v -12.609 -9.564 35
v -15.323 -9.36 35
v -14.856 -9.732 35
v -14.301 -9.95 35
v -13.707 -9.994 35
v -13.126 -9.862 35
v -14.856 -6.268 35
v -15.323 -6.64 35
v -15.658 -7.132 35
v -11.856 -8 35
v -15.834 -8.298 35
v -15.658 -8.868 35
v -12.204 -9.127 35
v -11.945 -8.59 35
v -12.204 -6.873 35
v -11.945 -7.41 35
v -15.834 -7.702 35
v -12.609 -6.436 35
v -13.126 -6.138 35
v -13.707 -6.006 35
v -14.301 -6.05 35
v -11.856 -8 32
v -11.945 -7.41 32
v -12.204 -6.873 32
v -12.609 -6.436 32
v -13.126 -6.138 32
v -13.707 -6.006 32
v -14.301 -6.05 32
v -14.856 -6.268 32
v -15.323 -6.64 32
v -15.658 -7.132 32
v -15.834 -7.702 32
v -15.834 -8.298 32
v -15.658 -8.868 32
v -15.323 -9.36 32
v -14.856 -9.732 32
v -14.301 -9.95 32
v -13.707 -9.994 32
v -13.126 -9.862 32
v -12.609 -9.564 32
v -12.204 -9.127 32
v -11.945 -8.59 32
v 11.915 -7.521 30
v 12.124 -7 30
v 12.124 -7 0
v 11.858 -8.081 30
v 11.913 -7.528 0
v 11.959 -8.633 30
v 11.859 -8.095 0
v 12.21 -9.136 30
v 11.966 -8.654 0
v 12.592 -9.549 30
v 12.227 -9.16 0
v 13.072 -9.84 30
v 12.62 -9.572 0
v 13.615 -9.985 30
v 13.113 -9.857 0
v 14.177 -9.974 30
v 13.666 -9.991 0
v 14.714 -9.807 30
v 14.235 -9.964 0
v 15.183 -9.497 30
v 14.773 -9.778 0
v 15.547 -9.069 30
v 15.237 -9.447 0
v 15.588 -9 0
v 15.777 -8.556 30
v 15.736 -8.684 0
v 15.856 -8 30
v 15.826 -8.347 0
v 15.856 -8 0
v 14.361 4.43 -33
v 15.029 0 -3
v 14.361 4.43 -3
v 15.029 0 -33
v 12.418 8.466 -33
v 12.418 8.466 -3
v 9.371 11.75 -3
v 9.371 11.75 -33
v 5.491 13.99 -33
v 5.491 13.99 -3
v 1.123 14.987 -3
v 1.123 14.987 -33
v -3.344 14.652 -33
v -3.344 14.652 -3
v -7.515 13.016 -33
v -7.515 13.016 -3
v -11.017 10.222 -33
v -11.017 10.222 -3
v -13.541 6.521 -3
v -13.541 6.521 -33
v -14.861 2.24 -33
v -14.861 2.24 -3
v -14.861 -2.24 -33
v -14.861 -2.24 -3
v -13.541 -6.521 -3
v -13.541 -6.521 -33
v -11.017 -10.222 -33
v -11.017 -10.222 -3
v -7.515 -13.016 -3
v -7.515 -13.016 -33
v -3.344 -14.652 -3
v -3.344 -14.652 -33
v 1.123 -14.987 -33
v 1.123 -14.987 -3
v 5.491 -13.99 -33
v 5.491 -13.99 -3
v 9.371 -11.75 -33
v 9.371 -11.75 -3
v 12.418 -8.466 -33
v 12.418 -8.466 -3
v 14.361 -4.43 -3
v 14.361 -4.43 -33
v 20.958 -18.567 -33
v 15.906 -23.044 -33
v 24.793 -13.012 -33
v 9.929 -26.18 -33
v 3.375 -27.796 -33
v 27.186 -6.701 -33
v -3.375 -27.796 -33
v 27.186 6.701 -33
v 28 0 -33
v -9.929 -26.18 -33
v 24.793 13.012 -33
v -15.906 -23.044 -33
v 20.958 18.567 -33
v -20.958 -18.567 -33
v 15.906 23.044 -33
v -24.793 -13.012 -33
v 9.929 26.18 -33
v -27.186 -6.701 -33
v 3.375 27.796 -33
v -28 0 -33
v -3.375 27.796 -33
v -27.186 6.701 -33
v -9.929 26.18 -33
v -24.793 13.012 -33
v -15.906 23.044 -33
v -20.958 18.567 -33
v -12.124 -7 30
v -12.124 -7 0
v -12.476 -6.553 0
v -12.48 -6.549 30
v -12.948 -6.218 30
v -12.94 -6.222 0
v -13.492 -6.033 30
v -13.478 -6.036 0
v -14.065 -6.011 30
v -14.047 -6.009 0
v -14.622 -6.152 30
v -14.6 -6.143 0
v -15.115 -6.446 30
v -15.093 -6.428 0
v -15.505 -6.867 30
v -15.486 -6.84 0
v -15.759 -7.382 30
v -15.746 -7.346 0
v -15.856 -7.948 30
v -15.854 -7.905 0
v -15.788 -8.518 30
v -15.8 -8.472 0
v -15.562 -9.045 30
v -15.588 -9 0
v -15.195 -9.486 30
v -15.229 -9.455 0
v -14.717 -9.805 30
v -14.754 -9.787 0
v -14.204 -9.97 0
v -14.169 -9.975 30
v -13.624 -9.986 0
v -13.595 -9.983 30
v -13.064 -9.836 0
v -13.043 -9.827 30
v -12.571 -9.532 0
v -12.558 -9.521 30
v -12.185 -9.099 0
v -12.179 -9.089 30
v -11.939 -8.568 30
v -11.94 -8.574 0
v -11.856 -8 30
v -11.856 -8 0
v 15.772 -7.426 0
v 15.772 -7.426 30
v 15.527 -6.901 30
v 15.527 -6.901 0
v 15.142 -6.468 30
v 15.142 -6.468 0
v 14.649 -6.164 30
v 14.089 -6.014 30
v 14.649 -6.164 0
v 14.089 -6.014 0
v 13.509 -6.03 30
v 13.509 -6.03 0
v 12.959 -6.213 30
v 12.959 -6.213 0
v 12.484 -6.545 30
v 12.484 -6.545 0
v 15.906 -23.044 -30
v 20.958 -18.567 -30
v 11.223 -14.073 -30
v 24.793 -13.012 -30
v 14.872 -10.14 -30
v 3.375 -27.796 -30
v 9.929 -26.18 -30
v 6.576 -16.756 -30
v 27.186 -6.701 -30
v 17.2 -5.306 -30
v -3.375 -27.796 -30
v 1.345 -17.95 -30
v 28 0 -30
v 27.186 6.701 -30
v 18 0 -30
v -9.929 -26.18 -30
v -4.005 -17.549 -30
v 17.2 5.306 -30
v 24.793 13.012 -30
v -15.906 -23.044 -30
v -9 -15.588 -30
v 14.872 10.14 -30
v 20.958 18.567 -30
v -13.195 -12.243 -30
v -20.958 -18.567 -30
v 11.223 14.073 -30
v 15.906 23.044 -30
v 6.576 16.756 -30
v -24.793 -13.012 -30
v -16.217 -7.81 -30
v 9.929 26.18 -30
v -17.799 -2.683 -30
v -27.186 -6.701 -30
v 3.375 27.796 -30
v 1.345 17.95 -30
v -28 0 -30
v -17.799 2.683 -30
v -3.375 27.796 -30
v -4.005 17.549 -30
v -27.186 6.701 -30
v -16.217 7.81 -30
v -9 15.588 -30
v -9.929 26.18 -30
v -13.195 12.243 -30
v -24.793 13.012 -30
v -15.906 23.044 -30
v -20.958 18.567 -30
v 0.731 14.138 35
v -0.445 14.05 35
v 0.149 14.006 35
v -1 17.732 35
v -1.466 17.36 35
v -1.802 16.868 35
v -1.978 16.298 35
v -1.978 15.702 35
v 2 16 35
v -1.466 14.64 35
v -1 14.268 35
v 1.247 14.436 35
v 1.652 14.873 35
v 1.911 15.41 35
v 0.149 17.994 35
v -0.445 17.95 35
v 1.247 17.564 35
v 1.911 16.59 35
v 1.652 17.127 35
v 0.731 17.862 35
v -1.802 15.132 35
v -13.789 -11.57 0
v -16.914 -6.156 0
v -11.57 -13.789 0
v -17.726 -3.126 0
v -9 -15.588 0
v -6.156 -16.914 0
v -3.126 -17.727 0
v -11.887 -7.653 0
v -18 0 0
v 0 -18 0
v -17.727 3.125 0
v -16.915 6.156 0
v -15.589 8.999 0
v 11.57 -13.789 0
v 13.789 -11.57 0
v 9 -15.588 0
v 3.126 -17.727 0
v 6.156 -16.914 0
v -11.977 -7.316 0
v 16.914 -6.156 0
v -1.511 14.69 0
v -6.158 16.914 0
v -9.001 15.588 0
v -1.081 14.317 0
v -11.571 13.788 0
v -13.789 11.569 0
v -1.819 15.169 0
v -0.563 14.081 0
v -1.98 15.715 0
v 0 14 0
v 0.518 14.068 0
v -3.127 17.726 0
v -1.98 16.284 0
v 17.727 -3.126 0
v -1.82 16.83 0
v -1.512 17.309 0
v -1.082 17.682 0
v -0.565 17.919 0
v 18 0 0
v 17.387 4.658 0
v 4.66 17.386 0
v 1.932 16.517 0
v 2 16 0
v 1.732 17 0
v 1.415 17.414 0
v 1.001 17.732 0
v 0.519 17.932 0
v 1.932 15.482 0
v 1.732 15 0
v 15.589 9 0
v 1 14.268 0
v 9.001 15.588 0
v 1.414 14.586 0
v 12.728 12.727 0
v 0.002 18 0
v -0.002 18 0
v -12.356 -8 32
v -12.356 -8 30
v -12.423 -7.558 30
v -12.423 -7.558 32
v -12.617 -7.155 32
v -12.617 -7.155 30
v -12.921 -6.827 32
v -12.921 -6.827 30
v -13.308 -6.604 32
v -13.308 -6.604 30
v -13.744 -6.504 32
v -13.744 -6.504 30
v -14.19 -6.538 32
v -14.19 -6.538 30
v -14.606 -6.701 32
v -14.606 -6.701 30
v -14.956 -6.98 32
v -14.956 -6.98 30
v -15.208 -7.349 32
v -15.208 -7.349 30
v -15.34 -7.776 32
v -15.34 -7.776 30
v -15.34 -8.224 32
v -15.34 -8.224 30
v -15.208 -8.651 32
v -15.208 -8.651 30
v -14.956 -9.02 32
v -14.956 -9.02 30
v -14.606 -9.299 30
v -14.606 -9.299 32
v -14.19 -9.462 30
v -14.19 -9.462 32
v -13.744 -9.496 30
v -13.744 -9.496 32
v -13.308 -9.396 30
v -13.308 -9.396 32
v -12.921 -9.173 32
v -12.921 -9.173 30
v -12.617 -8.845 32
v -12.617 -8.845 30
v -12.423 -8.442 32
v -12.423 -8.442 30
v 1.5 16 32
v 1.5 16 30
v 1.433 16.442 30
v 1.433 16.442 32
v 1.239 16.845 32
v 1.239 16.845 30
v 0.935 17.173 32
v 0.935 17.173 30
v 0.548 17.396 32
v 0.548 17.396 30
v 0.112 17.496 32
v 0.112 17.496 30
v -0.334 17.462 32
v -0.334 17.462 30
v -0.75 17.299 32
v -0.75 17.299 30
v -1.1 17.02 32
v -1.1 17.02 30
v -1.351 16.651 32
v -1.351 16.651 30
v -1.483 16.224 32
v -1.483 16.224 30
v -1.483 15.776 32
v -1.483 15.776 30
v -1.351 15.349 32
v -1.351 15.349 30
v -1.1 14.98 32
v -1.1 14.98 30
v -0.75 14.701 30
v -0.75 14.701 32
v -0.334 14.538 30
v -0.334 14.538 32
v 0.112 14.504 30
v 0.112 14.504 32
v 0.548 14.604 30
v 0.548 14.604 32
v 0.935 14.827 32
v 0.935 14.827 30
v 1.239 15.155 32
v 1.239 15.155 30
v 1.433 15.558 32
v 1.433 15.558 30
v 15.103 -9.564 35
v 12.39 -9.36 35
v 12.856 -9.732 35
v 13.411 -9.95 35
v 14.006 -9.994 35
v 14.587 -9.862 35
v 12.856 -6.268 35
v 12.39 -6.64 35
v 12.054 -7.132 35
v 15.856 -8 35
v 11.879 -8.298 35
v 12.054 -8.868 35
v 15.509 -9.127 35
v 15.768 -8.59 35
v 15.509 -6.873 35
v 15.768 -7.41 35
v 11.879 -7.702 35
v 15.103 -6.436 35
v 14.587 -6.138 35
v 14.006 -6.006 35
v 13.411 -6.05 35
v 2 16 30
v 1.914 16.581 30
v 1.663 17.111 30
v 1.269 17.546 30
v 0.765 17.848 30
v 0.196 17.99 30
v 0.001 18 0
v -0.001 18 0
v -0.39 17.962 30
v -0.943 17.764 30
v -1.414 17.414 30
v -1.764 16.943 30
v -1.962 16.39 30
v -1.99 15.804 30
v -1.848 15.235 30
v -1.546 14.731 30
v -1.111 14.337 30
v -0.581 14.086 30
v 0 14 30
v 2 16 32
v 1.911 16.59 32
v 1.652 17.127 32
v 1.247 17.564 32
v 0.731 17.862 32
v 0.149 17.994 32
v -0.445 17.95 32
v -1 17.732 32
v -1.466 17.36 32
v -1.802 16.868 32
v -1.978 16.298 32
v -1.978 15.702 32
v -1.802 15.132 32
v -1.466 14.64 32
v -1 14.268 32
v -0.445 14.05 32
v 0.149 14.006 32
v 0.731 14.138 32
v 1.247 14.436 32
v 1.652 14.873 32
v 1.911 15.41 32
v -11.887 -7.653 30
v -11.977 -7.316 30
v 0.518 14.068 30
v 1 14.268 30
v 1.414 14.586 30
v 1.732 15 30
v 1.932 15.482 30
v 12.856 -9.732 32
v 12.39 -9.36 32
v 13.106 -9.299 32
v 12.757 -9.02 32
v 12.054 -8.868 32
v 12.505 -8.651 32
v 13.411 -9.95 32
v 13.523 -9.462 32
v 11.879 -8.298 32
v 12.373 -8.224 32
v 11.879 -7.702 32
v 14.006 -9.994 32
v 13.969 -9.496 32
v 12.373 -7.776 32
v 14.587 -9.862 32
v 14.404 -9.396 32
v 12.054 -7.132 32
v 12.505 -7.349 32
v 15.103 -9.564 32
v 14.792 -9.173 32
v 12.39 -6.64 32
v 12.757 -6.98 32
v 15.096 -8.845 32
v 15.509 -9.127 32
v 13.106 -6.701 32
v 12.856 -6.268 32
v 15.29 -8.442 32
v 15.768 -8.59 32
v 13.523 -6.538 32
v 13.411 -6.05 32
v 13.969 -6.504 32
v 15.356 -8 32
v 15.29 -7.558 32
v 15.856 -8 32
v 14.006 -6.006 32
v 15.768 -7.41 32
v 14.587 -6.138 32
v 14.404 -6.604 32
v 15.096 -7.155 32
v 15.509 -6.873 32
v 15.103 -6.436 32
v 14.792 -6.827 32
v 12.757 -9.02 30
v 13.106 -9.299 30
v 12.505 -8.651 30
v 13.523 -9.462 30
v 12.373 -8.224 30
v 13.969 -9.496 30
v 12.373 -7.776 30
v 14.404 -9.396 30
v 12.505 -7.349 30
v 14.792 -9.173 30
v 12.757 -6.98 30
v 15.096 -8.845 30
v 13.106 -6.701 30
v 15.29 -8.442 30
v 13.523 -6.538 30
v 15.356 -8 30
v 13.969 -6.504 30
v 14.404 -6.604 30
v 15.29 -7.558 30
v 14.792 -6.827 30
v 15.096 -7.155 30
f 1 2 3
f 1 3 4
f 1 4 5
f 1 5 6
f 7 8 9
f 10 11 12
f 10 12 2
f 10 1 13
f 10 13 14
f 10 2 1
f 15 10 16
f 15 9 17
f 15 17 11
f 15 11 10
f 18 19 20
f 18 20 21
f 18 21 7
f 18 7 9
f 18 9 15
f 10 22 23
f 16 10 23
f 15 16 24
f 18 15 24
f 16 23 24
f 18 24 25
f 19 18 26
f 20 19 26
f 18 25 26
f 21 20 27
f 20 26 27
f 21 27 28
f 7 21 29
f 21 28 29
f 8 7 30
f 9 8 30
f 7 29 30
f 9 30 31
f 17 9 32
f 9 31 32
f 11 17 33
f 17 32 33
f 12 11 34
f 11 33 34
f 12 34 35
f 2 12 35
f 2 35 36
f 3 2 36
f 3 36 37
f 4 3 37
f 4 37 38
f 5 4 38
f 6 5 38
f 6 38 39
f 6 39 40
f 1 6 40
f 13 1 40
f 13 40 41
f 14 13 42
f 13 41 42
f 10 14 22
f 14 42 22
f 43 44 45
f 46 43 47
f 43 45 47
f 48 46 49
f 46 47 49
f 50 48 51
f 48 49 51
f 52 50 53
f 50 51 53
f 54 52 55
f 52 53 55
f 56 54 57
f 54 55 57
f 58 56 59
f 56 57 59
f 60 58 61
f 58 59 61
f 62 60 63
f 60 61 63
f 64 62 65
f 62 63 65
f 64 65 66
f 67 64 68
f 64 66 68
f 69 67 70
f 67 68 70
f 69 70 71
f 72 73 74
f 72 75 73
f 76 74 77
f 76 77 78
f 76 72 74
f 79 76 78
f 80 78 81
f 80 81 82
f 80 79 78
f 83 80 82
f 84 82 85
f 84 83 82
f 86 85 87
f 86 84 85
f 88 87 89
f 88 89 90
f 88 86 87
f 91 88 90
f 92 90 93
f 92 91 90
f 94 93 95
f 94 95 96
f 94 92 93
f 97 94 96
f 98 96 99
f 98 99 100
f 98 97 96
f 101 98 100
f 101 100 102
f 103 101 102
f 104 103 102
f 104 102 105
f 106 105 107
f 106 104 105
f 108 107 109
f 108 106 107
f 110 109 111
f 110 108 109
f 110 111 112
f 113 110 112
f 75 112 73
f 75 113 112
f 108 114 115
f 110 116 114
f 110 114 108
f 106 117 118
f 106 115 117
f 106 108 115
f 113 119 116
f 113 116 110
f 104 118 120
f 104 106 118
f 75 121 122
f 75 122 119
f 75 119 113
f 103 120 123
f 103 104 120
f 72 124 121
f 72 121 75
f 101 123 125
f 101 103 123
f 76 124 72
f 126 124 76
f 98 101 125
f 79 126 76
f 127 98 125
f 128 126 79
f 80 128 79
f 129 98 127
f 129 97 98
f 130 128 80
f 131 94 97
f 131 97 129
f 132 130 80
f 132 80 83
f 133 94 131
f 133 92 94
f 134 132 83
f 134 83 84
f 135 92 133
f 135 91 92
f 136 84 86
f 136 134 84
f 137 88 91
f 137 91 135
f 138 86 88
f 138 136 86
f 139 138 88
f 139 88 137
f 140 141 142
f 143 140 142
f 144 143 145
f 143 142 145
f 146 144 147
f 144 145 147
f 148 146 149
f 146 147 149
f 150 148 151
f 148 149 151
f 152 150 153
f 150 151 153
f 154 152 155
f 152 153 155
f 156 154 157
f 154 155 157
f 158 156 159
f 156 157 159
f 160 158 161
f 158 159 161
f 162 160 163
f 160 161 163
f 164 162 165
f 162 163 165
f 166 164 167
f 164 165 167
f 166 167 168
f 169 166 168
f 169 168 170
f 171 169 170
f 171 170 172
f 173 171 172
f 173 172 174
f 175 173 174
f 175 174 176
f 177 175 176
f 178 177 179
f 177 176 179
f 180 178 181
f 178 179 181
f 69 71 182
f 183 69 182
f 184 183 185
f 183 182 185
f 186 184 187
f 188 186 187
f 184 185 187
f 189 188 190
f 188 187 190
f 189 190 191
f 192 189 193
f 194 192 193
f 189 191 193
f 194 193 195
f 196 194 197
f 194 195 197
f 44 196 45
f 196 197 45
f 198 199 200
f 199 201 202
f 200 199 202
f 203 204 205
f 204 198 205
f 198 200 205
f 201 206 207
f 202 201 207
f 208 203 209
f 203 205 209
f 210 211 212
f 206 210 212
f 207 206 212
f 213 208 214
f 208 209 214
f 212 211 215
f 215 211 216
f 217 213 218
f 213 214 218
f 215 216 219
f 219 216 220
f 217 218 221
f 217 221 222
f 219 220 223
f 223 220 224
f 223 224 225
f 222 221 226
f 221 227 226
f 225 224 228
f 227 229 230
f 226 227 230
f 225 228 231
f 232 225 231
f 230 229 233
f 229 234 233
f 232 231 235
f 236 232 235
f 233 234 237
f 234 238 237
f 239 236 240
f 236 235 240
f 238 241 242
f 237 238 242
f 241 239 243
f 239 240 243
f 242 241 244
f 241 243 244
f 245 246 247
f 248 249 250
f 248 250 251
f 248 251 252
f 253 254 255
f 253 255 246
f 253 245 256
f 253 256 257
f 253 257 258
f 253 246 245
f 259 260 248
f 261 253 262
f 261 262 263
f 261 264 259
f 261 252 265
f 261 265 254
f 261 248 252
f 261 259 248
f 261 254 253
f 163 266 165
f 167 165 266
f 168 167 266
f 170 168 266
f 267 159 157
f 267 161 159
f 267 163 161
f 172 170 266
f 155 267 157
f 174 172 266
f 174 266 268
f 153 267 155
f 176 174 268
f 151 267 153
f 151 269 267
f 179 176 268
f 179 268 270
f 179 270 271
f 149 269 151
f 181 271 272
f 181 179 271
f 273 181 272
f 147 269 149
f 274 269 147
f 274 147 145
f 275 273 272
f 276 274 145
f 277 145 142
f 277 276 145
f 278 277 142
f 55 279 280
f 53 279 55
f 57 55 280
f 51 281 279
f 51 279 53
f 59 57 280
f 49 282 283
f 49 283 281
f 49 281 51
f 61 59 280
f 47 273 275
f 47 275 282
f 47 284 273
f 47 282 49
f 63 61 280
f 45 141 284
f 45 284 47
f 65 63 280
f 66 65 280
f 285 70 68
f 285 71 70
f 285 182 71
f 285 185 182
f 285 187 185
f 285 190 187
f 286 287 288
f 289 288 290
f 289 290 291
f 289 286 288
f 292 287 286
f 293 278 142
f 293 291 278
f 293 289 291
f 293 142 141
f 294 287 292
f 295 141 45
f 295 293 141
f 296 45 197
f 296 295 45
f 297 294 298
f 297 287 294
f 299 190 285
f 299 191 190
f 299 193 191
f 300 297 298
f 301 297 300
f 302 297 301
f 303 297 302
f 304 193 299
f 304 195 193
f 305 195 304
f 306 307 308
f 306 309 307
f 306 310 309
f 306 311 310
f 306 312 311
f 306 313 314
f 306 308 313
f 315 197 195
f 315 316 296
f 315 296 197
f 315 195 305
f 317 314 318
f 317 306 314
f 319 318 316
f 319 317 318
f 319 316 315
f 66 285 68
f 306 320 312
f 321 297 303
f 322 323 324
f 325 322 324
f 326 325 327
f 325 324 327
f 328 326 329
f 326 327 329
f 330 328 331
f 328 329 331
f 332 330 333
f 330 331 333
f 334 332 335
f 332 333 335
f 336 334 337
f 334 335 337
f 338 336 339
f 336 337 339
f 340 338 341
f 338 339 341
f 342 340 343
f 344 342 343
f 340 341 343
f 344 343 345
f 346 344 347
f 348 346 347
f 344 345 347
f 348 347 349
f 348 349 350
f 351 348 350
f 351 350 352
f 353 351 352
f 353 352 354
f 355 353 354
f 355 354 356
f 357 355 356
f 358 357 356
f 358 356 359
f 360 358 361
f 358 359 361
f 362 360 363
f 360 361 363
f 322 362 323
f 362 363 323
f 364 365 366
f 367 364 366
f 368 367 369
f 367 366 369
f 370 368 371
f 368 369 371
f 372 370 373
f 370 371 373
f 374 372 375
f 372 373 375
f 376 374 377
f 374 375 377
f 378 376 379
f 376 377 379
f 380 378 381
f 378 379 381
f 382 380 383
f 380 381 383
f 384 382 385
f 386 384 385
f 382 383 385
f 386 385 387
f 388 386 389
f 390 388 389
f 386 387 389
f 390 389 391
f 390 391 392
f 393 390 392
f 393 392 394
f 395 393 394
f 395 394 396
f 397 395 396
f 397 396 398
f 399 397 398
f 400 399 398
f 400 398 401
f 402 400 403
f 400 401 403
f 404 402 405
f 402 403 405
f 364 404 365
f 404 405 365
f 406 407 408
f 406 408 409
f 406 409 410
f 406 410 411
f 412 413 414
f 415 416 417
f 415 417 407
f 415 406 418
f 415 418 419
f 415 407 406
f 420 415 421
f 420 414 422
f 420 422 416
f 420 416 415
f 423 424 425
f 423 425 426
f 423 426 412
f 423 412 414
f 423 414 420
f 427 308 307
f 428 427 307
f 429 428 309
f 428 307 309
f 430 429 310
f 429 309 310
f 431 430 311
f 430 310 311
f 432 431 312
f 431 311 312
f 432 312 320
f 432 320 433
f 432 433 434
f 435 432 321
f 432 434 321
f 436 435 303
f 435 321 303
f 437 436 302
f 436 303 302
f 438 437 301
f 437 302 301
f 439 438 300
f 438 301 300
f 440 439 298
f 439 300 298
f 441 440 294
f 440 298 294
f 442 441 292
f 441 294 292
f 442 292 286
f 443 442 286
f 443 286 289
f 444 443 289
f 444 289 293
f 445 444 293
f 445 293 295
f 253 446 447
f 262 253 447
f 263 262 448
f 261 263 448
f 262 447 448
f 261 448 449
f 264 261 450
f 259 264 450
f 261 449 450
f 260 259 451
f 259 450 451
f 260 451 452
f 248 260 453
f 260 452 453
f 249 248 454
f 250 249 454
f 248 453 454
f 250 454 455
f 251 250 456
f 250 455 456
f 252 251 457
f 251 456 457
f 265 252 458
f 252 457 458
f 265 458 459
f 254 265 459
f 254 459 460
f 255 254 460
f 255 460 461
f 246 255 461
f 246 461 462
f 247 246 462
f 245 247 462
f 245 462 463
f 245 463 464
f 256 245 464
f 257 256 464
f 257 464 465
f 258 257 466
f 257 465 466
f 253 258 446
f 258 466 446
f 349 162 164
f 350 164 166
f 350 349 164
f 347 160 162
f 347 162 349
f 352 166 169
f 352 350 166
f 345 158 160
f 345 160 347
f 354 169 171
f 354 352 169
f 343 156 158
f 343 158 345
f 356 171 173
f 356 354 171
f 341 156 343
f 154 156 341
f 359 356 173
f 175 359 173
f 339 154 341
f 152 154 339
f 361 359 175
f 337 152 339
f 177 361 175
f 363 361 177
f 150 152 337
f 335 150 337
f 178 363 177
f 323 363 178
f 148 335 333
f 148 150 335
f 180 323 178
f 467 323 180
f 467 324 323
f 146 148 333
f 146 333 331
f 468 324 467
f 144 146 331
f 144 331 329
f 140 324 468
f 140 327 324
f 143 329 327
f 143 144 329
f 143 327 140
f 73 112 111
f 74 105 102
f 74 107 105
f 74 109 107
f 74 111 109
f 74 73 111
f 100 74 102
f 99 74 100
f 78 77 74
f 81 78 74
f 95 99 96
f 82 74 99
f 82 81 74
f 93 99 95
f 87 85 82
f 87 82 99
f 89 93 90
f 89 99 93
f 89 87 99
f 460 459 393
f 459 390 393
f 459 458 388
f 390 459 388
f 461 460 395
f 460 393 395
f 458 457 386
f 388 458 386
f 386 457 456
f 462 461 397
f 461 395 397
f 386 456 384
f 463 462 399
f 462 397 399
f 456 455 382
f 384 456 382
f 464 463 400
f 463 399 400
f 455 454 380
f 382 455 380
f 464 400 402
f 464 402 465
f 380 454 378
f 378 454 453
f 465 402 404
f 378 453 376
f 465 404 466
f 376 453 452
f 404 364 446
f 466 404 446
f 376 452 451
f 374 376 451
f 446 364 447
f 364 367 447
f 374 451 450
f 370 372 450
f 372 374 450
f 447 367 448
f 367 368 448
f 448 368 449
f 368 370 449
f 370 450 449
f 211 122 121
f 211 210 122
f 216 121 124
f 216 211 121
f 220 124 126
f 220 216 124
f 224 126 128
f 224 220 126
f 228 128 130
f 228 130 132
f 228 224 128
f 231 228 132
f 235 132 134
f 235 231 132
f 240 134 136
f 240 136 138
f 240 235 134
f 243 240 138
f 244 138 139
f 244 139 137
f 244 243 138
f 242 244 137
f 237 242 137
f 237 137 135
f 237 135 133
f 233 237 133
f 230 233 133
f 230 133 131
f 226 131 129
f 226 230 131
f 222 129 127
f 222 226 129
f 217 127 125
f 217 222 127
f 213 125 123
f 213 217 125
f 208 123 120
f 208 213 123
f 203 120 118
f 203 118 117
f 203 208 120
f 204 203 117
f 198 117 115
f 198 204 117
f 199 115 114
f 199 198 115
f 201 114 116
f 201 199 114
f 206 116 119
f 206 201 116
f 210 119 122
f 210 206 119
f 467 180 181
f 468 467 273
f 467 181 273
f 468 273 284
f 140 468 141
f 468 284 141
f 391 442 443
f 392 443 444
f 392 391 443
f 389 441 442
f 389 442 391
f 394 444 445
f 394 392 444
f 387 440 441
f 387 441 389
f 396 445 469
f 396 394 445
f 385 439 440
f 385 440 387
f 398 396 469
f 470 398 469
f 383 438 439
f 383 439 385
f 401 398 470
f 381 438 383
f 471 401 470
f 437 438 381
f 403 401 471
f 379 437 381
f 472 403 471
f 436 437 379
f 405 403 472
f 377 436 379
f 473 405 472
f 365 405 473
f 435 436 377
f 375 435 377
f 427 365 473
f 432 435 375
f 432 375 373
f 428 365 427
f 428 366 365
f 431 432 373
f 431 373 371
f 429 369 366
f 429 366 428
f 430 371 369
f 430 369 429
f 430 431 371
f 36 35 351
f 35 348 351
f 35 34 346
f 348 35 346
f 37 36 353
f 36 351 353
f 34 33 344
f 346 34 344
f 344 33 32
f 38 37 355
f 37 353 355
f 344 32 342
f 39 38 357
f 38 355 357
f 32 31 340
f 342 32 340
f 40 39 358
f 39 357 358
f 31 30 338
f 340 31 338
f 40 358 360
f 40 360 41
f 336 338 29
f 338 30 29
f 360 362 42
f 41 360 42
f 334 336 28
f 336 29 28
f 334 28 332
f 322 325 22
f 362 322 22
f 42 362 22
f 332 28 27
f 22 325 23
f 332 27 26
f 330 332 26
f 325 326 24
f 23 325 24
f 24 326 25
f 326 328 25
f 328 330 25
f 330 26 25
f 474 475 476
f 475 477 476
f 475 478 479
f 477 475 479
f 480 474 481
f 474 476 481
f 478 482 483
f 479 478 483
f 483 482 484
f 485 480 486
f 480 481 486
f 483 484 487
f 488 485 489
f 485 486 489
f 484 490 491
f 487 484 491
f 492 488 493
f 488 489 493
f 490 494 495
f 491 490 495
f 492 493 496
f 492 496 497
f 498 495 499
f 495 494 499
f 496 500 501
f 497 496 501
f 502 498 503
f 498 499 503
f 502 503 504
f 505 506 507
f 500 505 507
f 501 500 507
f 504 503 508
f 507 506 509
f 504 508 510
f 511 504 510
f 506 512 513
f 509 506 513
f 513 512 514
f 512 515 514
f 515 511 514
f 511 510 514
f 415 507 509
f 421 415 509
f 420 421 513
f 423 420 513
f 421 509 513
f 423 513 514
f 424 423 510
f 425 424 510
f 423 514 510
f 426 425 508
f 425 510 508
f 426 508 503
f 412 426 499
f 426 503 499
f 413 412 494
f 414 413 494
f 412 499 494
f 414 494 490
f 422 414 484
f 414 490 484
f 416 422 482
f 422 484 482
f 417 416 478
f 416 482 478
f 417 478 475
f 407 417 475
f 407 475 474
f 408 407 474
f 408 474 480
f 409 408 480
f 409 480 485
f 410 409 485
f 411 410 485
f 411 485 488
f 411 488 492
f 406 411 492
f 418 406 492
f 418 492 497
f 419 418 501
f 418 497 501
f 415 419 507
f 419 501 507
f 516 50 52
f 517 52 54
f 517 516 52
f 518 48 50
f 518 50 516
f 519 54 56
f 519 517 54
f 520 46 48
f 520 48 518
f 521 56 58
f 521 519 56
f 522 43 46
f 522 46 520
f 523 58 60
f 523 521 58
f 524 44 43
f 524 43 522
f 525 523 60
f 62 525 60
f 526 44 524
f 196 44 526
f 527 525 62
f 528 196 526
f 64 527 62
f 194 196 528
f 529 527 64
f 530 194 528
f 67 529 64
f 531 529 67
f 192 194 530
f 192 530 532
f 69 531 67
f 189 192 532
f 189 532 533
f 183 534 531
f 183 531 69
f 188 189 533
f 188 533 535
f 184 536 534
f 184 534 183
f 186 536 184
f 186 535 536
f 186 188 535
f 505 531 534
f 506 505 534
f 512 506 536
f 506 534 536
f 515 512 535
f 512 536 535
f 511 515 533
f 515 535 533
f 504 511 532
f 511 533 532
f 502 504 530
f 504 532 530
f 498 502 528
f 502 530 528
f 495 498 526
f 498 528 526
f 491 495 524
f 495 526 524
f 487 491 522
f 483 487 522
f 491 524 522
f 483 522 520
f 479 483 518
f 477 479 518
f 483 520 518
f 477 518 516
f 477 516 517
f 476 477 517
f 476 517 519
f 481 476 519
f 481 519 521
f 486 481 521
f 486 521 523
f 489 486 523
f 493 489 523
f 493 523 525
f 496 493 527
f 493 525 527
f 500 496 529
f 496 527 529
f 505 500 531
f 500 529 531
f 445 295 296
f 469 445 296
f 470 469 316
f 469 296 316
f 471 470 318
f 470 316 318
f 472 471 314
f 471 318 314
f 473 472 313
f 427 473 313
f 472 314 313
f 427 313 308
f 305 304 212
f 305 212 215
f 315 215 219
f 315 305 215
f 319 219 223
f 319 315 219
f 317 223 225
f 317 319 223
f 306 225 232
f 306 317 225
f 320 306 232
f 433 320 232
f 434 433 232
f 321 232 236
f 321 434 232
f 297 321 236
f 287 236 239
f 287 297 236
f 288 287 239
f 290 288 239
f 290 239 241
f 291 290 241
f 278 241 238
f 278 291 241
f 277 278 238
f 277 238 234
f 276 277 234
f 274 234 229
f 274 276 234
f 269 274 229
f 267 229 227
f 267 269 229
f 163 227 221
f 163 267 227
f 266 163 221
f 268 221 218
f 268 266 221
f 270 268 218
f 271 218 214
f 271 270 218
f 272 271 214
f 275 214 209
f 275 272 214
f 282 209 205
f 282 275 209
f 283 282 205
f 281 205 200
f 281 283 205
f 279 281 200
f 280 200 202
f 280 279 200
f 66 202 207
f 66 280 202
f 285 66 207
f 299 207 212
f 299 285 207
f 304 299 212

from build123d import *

# Parameters (mm, degrees)
F0_W      = 10
F0_H      = 3
F3_DEPTH  = 30
F4_R      = 1.5
F5_DEPTH  = 2
F6_R      = 2
F7_DEPTH  = 3
F8_R      = 1.5
F9_DEPTH  = 2
F10_R     = 2
F11_DEPTH = 3
F12_R     = 1.5
F13_DEPTH = 2
F14_R     = 2
F15_DEPTH = 3


with BuildPart() as f1:
    # F0 (on Front) → F1 (revolve)
    with BuildSketch(Plane.XZ):
        Polygon((18, -30), (18, -3), (15.029126, -3), (15.029126, -33), (18, -33), align=None)
        Polygon((15.029126, -3), (18, -3), (18, 0), (0, 0), (0, -3), align=None)
        with Locations((23, -31.5)):
            Rectangle(F0_W, F0_H)
    revolve(axis=Axis((0, 0, -1.5), (0, 0, 1)))

    # F2 (on face) → F3 (join)
    with BuildSketch(Plane.XY):
        with BuildLine():
            ThreePointArc((0, 14), (1.414214, 14.585786), (2, 16))
            ThreePointArc((2, 16), (-1.414214, 17.414214), (0, 14))
        make_face()
        with BuildLine():
            ThreePointArc((15.856406, -8), (14.374045, -6.068148), (12.124356, -7))
            ThreePointArc((12.124356, -7), (13.338768, -9.931852), (15.856406, -8))
        make_face()
        with BuildLine():
            ThreePointArc((-11.856406, -8), (-11.924555, -7.482362), (-12.124356, -7))
            ThreePointArc((-12.124356, -7), (-15.788258, -8.517638), (-11.856406, -8))
        make_face()
    extrude(amount=F3_DEPTH)

    # F4 (on face) → F5 (join)
    with BuildSketch(Plane.XY.offset(30)):
        with Locations((13.856406, -8)):
            Circle(F4_R)
    extrude(amount=F5_DEPTH)

    # F6 (on face) → F7 (join)
    with BuildSketch(Plane.XY.offset(32)):
        with Locations((13.856406, -8)):
            Circle(F6_R)
    extrude(amount=F7_DEPTH)

    # F8 (on face) → F9 (join)
    with BuildSketch(Plane.XY.offset(30)):
        with Locations((0, 16)):
            Circle(F8_R)
    extrude(amount=F9_DEPTH)

    # F10 (on face) → F11 (join)
    with BuildSketch(Plane.XY.offset(32)):
        with Locations((0, 16)):
            Circle(F10_R)
    extrude(amount=F11_DEPTH)

    # F12 (on face) → F13 (join)
    with BuildSketch(Plane.XY.offset(30)):
        with Locations((-13.856406, -8)):
            Circle(F12_R)
    extrude(amount=F13_DEPTH)

    # F14 (on face) → F15 (join)
    with BuildSketch(Plane.XY.offset(32)):
        with Locations((-13.856406, -8)):
            Circle(F14_R)
    extrude(amount=F15_DEPTH)


solid = f1.part
